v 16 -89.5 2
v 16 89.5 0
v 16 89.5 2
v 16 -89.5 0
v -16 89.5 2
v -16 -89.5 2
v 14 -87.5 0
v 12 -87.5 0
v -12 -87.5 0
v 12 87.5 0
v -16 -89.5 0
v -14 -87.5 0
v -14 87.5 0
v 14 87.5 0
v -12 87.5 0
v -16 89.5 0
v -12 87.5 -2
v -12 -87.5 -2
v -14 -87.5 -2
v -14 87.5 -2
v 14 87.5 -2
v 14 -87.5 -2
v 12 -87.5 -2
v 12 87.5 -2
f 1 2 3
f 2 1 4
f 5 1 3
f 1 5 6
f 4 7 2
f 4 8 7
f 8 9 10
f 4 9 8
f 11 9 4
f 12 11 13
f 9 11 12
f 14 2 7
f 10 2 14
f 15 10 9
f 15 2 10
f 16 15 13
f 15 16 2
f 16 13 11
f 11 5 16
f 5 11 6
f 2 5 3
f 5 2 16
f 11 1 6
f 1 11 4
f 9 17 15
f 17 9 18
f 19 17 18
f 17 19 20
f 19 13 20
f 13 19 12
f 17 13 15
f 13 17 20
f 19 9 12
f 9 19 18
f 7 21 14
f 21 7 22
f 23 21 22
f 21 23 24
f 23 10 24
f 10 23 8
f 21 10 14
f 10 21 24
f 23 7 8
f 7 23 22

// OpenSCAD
$fn=50;

// Lid exterior dimensions
LID_W = 32; // Lid Width, the width of the box plus twice the wall thickness
LID_L = 179; // Lid Length, the length of the box plus twice the wall thickness
LID_H = 2; // Lid Height

// Runners dimensions
RUNNER_W = 2; // Runner Width
RUNNER_L = LID_L - 4; // Runner Length, slightly less than lid length to avoid overhang
RUNNER_H = 2; // Runner Height, same as wall thickness

// Wall thickness
WALL_THICKNESS = 2;

union() {
    // Create the lid
    translate([0, 0, RUNNER_H/2])
        cube([LID_W, LID_L, LID_H], center=true);

    // Add runners under the lid
    translate([-LID_W/2 + RUNNER_W/2 + WALL_THICKNESS, 0, -RUNNER_H/2])
        cube([RUNNER_W, RUNNER_L, RUNNER_H], center=true);

    translate([LID_W/2 - RUNNER_W/2 - WALL_THICKNESS, 0, -RUNNER_H/2])
        #cube([RUNNER_W, RUNNER_L, RUNNER_H], center=true);
}
